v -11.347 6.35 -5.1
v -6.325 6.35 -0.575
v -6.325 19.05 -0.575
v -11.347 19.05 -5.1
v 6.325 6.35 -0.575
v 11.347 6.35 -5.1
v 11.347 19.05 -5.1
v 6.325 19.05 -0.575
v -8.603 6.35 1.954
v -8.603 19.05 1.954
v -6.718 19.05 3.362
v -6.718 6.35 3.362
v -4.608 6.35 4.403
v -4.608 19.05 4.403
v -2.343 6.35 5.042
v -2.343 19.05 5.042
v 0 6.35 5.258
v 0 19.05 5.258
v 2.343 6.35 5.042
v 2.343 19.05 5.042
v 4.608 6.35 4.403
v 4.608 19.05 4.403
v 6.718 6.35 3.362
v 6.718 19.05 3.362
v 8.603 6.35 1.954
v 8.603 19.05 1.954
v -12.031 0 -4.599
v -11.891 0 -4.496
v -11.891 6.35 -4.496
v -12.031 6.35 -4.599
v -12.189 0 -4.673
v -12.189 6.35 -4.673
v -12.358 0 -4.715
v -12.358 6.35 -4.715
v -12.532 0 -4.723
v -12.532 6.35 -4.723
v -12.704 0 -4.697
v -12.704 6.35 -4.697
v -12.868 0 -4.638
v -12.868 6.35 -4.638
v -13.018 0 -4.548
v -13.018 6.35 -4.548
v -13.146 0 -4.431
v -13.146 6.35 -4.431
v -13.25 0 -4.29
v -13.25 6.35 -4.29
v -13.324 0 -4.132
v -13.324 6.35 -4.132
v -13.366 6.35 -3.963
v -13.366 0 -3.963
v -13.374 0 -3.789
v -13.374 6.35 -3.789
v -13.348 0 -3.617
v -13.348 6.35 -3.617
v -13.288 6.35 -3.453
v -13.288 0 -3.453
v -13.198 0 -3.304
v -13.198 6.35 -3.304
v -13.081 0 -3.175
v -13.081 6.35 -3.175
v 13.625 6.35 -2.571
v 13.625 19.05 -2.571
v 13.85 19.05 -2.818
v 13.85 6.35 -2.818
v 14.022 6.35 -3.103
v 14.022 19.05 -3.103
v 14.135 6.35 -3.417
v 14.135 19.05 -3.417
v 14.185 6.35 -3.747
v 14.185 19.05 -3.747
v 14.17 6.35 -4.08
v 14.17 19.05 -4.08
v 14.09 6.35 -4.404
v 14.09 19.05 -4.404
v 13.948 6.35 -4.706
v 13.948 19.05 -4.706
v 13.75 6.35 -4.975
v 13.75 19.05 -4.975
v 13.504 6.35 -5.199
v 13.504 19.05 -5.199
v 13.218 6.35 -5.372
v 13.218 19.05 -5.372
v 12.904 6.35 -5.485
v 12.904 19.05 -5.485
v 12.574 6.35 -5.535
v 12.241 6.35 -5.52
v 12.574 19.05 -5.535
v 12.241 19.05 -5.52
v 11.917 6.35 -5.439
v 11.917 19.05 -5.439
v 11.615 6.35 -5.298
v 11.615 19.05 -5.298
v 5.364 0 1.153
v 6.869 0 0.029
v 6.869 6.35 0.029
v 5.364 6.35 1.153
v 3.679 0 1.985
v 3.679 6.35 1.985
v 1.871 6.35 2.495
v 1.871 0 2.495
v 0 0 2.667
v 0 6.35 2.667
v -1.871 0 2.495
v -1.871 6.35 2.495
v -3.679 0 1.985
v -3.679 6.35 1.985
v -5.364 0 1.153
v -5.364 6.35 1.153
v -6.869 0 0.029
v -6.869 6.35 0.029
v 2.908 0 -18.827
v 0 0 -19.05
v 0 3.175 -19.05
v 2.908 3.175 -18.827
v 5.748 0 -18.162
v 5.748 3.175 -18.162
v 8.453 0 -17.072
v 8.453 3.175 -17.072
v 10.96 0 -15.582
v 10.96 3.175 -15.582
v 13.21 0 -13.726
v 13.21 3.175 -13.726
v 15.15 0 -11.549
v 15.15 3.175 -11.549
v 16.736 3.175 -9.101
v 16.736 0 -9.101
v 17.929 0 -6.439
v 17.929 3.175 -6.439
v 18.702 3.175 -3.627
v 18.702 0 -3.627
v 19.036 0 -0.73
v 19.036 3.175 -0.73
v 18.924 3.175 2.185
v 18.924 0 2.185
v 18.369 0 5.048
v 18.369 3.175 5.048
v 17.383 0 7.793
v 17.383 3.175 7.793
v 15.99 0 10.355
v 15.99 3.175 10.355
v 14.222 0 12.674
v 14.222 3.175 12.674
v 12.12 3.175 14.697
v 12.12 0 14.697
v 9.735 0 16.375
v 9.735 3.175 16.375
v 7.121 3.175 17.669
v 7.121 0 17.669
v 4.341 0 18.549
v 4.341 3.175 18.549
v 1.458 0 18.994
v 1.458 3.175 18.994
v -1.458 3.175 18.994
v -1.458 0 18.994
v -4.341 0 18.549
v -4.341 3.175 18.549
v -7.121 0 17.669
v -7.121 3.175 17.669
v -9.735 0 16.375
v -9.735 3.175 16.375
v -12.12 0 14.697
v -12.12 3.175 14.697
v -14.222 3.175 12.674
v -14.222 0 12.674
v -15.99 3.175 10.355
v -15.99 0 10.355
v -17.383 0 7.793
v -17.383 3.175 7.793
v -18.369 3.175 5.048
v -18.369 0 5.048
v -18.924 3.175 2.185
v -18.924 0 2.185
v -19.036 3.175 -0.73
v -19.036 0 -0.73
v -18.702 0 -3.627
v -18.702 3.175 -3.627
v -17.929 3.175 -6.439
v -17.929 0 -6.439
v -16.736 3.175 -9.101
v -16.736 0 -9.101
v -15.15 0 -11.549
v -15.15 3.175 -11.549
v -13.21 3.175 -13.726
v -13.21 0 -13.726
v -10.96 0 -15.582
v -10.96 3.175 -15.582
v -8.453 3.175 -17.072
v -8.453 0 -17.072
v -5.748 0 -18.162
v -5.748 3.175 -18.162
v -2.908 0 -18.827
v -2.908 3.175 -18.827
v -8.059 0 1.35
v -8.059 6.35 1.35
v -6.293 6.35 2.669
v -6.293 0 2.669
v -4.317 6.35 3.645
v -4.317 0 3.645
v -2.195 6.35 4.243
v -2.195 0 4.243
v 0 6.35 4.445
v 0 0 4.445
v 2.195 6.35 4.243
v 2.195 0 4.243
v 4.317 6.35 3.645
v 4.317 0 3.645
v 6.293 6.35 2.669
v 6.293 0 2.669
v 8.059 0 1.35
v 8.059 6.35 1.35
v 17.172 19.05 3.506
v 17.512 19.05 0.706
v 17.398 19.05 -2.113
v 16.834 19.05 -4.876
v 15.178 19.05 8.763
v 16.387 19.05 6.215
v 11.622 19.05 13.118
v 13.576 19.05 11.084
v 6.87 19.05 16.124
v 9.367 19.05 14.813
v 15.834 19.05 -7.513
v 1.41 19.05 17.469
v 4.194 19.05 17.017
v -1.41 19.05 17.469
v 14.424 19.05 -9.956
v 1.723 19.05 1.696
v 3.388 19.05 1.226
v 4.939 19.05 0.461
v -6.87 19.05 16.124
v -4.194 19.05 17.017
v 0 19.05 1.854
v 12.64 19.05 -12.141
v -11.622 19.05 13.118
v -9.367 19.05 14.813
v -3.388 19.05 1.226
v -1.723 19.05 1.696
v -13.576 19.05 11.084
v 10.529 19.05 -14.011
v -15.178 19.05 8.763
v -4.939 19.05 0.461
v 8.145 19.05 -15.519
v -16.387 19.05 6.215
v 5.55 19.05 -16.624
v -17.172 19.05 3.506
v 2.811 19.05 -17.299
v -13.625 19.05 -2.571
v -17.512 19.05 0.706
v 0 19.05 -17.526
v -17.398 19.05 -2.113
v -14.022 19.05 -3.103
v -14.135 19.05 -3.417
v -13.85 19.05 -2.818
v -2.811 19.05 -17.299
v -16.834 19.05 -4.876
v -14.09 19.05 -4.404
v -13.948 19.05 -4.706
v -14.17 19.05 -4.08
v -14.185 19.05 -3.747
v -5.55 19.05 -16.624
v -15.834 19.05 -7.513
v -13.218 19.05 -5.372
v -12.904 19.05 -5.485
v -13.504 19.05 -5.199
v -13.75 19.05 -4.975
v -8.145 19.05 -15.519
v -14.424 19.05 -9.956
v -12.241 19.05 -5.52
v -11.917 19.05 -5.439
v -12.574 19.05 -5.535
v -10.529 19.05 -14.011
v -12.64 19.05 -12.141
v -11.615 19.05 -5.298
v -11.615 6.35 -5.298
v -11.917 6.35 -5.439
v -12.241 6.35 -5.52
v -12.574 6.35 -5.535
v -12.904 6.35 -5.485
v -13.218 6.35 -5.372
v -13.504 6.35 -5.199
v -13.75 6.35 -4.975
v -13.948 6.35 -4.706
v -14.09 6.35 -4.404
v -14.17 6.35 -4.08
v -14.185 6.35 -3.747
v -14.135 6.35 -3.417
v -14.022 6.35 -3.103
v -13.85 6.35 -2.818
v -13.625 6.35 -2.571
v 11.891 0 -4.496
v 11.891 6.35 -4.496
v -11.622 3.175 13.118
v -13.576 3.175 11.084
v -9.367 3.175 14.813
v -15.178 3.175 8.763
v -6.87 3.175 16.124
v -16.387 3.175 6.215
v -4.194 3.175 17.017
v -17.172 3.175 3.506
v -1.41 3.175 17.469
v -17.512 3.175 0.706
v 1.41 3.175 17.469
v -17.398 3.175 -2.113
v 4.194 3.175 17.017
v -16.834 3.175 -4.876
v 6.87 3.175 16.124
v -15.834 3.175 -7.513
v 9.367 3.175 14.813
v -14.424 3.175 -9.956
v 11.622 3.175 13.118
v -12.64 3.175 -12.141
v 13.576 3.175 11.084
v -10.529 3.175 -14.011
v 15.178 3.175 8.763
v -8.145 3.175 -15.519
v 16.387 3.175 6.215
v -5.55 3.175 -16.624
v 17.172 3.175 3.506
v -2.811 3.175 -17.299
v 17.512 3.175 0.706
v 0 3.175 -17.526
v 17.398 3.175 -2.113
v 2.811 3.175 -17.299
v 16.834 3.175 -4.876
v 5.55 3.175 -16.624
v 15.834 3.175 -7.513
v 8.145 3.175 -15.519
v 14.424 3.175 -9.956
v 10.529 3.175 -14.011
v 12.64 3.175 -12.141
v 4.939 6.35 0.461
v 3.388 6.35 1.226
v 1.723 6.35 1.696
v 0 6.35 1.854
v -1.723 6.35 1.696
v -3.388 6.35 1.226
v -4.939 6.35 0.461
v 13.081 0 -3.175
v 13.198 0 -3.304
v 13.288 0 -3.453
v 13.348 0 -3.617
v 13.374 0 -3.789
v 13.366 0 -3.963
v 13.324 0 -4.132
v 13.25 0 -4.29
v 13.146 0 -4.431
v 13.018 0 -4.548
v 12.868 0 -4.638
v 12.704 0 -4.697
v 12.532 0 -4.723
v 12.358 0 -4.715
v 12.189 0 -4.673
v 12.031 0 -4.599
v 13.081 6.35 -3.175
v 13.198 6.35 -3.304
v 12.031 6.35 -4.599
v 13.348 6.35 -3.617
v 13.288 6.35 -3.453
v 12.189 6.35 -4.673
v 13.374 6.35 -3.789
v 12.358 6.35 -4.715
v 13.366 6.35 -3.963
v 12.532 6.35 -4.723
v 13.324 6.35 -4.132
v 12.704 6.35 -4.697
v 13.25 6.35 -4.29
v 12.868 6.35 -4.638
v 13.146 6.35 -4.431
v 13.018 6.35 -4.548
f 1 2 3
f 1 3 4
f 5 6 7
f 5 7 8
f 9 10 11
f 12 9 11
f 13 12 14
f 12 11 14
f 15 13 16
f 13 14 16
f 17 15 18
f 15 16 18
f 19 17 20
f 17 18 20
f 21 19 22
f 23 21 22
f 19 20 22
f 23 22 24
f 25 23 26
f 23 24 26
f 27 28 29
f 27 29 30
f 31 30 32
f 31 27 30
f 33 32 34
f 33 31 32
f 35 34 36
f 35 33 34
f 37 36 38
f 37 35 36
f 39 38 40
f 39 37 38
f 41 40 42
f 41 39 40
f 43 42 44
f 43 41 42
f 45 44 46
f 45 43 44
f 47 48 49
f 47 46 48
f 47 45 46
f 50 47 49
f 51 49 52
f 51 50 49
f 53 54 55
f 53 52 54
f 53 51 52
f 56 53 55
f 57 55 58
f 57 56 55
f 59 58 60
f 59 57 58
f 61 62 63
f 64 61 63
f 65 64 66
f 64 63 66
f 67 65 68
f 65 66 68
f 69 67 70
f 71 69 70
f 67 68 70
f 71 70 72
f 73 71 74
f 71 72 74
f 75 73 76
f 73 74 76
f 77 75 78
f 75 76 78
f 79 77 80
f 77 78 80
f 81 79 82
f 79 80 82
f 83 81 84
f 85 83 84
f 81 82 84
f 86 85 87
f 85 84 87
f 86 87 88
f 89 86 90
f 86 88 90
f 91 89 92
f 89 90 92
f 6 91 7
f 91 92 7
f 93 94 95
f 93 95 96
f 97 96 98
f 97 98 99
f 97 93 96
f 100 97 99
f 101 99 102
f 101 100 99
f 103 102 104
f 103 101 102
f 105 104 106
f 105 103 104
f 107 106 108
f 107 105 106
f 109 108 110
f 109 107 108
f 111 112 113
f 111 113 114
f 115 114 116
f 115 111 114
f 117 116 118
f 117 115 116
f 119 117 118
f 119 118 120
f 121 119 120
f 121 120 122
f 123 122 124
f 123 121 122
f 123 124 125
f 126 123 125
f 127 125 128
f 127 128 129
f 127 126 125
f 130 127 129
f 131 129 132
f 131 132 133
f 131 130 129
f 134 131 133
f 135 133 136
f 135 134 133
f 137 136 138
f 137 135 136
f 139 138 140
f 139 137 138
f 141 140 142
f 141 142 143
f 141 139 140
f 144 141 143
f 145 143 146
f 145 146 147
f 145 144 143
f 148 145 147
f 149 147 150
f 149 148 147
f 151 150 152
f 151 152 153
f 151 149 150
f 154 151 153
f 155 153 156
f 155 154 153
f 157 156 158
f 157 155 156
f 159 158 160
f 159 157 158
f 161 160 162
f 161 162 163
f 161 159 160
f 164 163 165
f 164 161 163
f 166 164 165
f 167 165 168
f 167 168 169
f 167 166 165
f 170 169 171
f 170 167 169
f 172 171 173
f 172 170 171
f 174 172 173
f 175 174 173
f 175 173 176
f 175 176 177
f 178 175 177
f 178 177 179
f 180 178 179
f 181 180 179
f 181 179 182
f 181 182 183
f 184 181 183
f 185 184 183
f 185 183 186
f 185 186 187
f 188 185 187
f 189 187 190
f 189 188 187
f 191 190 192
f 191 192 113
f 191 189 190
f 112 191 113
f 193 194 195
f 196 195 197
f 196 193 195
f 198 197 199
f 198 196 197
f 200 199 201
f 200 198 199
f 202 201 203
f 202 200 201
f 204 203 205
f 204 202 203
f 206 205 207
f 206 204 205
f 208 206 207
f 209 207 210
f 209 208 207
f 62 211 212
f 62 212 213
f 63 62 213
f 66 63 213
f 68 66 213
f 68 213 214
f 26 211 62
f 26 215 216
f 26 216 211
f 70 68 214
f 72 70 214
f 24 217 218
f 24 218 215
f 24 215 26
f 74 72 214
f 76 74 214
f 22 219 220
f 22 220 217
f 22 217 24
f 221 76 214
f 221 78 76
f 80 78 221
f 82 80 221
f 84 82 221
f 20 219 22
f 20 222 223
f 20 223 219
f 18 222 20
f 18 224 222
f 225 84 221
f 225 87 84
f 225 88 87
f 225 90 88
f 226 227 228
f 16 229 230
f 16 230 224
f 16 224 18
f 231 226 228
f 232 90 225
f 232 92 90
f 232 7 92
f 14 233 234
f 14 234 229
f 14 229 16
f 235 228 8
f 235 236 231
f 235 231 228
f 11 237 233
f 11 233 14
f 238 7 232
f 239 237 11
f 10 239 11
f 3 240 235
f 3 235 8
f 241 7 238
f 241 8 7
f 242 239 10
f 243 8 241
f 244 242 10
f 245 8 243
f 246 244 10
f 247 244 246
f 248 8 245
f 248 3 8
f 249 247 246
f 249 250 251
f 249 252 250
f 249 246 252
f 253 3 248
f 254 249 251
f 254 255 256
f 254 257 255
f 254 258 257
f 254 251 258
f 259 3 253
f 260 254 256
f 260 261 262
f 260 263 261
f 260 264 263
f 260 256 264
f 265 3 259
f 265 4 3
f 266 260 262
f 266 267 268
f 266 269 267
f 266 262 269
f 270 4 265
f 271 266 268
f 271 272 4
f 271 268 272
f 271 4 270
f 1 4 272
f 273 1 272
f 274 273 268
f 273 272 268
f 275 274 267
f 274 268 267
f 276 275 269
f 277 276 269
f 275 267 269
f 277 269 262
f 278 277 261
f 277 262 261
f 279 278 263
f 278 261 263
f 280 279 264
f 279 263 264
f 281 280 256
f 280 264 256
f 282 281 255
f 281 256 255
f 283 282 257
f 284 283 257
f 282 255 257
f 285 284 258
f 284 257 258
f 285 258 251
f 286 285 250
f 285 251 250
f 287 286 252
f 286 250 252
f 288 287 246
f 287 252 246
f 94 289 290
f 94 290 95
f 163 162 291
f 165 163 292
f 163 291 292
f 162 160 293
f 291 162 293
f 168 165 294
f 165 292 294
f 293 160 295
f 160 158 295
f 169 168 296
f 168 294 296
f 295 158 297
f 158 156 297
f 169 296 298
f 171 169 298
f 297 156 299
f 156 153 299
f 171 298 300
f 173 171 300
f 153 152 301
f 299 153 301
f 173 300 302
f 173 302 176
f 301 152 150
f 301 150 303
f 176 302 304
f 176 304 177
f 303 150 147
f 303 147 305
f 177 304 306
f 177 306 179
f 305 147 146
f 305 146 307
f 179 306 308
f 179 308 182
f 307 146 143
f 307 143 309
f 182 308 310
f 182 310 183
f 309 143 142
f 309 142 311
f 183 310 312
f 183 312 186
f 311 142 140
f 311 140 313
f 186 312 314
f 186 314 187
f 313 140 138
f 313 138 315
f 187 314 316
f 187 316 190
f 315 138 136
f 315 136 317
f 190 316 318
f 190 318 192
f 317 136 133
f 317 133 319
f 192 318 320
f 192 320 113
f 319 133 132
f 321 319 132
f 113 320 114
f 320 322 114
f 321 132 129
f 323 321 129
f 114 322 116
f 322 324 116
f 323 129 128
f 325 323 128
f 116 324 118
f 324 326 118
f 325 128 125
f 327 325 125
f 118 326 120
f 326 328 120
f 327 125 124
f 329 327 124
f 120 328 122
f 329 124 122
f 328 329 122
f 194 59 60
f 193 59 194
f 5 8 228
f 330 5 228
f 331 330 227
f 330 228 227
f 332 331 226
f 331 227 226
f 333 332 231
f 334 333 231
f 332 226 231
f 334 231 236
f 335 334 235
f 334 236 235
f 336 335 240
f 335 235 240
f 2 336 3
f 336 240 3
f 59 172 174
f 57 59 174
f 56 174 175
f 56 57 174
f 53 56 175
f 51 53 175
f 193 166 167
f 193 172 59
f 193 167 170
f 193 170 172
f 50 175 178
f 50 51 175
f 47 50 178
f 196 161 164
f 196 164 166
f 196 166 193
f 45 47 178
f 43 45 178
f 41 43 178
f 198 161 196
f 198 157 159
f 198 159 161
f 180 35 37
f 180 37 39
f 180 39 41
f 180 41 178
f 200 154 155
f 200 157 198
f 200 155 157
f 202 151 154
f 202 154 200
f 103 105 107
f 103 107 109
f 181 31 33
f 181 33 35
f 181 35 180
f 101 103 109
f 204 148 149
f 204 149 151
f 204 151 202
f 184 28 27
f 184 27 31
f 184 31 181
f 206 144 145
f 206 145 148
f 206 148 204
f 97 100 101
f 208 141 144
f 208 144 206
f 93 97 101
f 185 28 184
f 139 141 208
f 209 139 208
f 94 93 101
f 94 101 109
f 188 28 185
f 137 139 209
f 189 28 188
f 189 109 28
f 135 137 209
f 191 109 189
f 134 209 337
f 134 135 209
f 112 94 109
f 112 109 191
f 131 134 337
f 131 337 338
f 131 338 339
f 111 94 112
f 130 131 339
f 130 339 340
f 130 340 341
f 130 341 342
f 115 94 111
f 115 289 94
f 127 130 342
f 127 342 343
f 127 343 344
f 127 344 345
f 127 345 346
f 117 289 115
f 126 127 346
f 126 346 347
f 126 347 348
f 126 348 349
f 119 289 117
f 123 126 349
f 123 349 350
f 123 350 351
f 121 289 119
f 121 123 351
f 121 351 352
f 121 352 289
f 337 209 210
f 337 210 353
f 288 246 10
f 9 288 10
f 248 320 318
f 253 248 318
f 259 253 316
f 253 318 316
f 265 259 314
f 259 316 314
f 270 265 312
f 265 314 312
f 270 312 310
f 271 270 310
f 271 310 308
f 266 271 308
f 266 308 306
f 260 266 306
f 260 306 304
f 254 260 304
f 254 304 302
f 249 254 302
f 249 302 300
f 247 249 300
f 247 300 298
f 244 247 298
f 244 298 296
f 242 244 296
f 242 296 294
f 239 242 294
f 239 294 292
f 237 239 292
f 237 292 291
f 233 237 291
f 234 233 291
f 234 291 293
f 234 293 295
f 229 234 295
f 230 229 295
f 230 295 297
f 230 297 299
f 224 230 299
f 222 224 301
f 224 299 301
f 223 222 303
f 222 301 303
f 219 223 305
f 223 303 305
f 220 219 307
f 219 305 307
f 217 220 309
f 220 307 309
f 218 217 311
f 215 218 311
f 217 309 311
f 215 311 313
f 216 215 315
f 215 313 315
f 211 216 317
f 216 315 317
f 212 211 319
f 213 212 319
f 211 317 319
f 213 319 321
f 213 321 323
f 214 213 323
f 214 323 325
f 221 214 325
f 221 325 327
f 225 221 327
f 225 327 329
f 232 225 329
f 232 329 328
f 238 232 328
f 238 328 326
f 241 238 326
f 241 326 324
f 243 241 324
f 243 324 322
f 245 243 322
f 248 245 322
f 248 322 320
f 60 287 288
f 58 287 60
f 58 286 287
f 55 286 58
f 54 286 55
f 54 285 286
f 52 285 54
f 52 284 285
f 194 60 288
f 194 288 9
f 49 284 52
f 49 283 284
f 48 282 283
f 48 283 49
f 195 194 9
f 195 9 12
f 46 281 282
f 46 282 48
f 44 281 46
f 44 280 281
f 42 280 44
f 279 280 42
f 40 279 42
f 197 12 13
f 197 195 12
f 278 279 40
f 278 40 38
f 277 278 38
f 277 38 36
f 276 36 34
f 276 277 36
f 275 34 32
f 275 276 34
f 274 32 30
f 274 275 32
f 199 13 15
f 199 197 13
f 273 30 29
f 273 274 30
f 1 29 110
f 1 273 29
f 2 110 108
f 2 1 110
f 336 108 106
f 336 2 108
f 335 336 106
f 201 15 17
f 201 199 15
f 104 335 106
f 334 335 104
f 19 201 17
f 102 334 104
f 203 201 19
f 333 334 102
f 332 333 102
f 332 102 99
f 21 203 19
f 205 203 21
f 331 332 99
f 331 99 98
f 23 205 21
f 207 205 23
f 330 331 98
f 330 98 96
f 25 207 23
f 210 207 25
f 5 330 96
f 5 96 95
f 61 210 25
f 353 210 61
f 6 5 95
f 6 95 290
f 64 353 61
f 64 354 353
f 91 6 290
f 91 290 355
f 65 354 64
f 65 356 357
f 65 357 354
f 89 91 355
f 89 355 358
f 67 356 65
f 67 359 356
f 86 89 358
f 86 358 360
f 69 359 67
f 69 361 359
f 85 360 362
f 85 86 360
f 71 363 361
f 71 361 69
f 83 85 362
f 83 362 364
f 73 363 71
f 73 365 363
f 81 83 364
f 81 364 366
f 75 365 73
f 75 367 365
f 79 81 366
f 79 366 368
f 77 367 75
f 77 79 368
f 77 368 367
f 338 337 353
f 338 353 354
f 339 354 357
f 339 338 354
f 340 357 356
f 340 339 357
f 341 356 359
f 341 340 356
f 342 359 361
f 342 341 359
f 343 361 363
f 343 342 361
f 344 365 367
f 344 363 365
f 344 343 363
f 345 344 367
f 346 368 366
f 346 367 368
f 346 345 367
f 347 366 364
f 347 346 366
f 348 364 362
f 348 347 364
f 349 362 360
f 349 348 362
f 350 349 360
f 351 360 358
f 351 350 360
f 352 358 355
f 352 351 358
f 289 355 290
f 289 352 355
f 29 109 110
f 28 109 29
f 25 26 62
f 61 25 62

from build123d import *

# Parameters (mm, degrees)
SKETCH2_R           = 17.526
BOSS_EXTRUDE1_DEPTH = 19.05
SKETCH15_R          = 19.05
BOSS_EXTRUDE2_DEPTH = 3.175
CUT_EXTRUDE2_DEPTH  = 12.7


with BuildPart() as part:
    # Sketch2 → Boss-Extrude1 (new body)
    with BuildSketch(Plane(origin=(0, 0, 0), x_dir=(1, 0, 0), z_dir=(0, 1, 0))):
        with Locations(Location((0, 0, 0), (0, 0, 90))):
            Circle(SKETCH2_R)
        with BuildLine():
            Line((-13.081, 3.175), (-8.059107313, -1.349826056))
            ThreePointArc((-8.059107313, -1.349826056), (0, -4.445), (8.059107313, -1.349826056))
            Line((8.059107313, -1.349826056), (13.081, 3.175))
            ThreePointArc((13.081, 3.175), (13.146371637, 4.430535164), (11.890836473, 4.495906802))
            Line((11.890836473, 4.495906802), (6.868943786, -0.028919255))
            ThreePointArc((6.868943786, -0.028919255), (0, -2.667), (-6.868943786, -0.028919255))
            Line((-6.868943786, -0.028919255), (-11.890836473, 4.495906802))
            ThreePointArc((-11.890836473, 4.495906802), (-13.146371637, 4.430535164), (-13.081, 3.175))
        make_face(mode=Mode.SUBTRACT)
    extrude(amount=BOSS_EXTRUDE1_DEPTH)

    # Sketch15 → Boss-Extrude2 (add)
    with BuildSketch(Plane.XZ):
        with Locations(Location((0, 0, 0), (0, 0, 270))):
            Circle(SKETCH15_R)
        with BuildLine():
            Line((-13.081, -3.175), (-8.059107313, 1.349826056))
            ThreePointArc((-8.059107313, 1.349826056), (0, 4.445), (8.059107313, 1.349826056))
            Line((8.059107313, 1.349826056), (13.081, -3.175))
            ThreePointArc((13.081, -3.175), (13.146371637, -4.430535164), (11.890836473, -4.495906802))
            Line((11.890836473, -4.495906802), (6.868943786, 0.028919255))
            ThreePointArc((6.868943786, 0.028919255), (0, 2.667), (-6.868943786, 0.028919255))
            Line((-6.868943786, 0.028919255), (-11.890836473, -4.495906802))
            ThreePointArc((-11.890836473, -4.495906802), (-13.146371637, -4.430535164), (-13.081, -3.175))
        make_face(mode=Mode.SUBTRACT)
    extrude(amount=-BOSS_EXTRUDE2_DEPTH)

    # Sketch14 → Cut-Extrude2 (cut)
    with BuildSketch(Plane(origin=(0, 19.05, 0), x_dir=(1, 0, 0), z_dir=(0, 1, 0))):
        with BuildLine():
            Line((8.603182068, -1.953669166), (13.625074755, 2.571156891))
            ThreePointArc((13.625074755, 2.571156891), (13.750214746, 4.97460992), (11.346761717, 5.099749911))
            Line((11.346761717, 5.099749911), (6.32486903, 0.574923855))
            ThreePointArc((6.32486903, 0.574923855), (0, -1.8542), (-6.32486903, 0.574923855))
            Line((-6.32486903, 0.574923855), (-11.346761717, 5.099749911))
            ThreePointArc((-11.346761717, 5.099749911), (-13.750214746, 4.97460992), (-13.625074755, 2.571156891))
            Line((-13.625074755, 2.571156891), (-8.603182068, -1.953669166))
            ThreePointArc((-8.603182068, -1.953669166), (0, -5.2578), (8.603182068, -1.953669166))
        make_face()
    extrude(amount=-CUT_EXTRUDE2_DEPTH, mode=Mode.SUBTRACT)


solid = part.part
